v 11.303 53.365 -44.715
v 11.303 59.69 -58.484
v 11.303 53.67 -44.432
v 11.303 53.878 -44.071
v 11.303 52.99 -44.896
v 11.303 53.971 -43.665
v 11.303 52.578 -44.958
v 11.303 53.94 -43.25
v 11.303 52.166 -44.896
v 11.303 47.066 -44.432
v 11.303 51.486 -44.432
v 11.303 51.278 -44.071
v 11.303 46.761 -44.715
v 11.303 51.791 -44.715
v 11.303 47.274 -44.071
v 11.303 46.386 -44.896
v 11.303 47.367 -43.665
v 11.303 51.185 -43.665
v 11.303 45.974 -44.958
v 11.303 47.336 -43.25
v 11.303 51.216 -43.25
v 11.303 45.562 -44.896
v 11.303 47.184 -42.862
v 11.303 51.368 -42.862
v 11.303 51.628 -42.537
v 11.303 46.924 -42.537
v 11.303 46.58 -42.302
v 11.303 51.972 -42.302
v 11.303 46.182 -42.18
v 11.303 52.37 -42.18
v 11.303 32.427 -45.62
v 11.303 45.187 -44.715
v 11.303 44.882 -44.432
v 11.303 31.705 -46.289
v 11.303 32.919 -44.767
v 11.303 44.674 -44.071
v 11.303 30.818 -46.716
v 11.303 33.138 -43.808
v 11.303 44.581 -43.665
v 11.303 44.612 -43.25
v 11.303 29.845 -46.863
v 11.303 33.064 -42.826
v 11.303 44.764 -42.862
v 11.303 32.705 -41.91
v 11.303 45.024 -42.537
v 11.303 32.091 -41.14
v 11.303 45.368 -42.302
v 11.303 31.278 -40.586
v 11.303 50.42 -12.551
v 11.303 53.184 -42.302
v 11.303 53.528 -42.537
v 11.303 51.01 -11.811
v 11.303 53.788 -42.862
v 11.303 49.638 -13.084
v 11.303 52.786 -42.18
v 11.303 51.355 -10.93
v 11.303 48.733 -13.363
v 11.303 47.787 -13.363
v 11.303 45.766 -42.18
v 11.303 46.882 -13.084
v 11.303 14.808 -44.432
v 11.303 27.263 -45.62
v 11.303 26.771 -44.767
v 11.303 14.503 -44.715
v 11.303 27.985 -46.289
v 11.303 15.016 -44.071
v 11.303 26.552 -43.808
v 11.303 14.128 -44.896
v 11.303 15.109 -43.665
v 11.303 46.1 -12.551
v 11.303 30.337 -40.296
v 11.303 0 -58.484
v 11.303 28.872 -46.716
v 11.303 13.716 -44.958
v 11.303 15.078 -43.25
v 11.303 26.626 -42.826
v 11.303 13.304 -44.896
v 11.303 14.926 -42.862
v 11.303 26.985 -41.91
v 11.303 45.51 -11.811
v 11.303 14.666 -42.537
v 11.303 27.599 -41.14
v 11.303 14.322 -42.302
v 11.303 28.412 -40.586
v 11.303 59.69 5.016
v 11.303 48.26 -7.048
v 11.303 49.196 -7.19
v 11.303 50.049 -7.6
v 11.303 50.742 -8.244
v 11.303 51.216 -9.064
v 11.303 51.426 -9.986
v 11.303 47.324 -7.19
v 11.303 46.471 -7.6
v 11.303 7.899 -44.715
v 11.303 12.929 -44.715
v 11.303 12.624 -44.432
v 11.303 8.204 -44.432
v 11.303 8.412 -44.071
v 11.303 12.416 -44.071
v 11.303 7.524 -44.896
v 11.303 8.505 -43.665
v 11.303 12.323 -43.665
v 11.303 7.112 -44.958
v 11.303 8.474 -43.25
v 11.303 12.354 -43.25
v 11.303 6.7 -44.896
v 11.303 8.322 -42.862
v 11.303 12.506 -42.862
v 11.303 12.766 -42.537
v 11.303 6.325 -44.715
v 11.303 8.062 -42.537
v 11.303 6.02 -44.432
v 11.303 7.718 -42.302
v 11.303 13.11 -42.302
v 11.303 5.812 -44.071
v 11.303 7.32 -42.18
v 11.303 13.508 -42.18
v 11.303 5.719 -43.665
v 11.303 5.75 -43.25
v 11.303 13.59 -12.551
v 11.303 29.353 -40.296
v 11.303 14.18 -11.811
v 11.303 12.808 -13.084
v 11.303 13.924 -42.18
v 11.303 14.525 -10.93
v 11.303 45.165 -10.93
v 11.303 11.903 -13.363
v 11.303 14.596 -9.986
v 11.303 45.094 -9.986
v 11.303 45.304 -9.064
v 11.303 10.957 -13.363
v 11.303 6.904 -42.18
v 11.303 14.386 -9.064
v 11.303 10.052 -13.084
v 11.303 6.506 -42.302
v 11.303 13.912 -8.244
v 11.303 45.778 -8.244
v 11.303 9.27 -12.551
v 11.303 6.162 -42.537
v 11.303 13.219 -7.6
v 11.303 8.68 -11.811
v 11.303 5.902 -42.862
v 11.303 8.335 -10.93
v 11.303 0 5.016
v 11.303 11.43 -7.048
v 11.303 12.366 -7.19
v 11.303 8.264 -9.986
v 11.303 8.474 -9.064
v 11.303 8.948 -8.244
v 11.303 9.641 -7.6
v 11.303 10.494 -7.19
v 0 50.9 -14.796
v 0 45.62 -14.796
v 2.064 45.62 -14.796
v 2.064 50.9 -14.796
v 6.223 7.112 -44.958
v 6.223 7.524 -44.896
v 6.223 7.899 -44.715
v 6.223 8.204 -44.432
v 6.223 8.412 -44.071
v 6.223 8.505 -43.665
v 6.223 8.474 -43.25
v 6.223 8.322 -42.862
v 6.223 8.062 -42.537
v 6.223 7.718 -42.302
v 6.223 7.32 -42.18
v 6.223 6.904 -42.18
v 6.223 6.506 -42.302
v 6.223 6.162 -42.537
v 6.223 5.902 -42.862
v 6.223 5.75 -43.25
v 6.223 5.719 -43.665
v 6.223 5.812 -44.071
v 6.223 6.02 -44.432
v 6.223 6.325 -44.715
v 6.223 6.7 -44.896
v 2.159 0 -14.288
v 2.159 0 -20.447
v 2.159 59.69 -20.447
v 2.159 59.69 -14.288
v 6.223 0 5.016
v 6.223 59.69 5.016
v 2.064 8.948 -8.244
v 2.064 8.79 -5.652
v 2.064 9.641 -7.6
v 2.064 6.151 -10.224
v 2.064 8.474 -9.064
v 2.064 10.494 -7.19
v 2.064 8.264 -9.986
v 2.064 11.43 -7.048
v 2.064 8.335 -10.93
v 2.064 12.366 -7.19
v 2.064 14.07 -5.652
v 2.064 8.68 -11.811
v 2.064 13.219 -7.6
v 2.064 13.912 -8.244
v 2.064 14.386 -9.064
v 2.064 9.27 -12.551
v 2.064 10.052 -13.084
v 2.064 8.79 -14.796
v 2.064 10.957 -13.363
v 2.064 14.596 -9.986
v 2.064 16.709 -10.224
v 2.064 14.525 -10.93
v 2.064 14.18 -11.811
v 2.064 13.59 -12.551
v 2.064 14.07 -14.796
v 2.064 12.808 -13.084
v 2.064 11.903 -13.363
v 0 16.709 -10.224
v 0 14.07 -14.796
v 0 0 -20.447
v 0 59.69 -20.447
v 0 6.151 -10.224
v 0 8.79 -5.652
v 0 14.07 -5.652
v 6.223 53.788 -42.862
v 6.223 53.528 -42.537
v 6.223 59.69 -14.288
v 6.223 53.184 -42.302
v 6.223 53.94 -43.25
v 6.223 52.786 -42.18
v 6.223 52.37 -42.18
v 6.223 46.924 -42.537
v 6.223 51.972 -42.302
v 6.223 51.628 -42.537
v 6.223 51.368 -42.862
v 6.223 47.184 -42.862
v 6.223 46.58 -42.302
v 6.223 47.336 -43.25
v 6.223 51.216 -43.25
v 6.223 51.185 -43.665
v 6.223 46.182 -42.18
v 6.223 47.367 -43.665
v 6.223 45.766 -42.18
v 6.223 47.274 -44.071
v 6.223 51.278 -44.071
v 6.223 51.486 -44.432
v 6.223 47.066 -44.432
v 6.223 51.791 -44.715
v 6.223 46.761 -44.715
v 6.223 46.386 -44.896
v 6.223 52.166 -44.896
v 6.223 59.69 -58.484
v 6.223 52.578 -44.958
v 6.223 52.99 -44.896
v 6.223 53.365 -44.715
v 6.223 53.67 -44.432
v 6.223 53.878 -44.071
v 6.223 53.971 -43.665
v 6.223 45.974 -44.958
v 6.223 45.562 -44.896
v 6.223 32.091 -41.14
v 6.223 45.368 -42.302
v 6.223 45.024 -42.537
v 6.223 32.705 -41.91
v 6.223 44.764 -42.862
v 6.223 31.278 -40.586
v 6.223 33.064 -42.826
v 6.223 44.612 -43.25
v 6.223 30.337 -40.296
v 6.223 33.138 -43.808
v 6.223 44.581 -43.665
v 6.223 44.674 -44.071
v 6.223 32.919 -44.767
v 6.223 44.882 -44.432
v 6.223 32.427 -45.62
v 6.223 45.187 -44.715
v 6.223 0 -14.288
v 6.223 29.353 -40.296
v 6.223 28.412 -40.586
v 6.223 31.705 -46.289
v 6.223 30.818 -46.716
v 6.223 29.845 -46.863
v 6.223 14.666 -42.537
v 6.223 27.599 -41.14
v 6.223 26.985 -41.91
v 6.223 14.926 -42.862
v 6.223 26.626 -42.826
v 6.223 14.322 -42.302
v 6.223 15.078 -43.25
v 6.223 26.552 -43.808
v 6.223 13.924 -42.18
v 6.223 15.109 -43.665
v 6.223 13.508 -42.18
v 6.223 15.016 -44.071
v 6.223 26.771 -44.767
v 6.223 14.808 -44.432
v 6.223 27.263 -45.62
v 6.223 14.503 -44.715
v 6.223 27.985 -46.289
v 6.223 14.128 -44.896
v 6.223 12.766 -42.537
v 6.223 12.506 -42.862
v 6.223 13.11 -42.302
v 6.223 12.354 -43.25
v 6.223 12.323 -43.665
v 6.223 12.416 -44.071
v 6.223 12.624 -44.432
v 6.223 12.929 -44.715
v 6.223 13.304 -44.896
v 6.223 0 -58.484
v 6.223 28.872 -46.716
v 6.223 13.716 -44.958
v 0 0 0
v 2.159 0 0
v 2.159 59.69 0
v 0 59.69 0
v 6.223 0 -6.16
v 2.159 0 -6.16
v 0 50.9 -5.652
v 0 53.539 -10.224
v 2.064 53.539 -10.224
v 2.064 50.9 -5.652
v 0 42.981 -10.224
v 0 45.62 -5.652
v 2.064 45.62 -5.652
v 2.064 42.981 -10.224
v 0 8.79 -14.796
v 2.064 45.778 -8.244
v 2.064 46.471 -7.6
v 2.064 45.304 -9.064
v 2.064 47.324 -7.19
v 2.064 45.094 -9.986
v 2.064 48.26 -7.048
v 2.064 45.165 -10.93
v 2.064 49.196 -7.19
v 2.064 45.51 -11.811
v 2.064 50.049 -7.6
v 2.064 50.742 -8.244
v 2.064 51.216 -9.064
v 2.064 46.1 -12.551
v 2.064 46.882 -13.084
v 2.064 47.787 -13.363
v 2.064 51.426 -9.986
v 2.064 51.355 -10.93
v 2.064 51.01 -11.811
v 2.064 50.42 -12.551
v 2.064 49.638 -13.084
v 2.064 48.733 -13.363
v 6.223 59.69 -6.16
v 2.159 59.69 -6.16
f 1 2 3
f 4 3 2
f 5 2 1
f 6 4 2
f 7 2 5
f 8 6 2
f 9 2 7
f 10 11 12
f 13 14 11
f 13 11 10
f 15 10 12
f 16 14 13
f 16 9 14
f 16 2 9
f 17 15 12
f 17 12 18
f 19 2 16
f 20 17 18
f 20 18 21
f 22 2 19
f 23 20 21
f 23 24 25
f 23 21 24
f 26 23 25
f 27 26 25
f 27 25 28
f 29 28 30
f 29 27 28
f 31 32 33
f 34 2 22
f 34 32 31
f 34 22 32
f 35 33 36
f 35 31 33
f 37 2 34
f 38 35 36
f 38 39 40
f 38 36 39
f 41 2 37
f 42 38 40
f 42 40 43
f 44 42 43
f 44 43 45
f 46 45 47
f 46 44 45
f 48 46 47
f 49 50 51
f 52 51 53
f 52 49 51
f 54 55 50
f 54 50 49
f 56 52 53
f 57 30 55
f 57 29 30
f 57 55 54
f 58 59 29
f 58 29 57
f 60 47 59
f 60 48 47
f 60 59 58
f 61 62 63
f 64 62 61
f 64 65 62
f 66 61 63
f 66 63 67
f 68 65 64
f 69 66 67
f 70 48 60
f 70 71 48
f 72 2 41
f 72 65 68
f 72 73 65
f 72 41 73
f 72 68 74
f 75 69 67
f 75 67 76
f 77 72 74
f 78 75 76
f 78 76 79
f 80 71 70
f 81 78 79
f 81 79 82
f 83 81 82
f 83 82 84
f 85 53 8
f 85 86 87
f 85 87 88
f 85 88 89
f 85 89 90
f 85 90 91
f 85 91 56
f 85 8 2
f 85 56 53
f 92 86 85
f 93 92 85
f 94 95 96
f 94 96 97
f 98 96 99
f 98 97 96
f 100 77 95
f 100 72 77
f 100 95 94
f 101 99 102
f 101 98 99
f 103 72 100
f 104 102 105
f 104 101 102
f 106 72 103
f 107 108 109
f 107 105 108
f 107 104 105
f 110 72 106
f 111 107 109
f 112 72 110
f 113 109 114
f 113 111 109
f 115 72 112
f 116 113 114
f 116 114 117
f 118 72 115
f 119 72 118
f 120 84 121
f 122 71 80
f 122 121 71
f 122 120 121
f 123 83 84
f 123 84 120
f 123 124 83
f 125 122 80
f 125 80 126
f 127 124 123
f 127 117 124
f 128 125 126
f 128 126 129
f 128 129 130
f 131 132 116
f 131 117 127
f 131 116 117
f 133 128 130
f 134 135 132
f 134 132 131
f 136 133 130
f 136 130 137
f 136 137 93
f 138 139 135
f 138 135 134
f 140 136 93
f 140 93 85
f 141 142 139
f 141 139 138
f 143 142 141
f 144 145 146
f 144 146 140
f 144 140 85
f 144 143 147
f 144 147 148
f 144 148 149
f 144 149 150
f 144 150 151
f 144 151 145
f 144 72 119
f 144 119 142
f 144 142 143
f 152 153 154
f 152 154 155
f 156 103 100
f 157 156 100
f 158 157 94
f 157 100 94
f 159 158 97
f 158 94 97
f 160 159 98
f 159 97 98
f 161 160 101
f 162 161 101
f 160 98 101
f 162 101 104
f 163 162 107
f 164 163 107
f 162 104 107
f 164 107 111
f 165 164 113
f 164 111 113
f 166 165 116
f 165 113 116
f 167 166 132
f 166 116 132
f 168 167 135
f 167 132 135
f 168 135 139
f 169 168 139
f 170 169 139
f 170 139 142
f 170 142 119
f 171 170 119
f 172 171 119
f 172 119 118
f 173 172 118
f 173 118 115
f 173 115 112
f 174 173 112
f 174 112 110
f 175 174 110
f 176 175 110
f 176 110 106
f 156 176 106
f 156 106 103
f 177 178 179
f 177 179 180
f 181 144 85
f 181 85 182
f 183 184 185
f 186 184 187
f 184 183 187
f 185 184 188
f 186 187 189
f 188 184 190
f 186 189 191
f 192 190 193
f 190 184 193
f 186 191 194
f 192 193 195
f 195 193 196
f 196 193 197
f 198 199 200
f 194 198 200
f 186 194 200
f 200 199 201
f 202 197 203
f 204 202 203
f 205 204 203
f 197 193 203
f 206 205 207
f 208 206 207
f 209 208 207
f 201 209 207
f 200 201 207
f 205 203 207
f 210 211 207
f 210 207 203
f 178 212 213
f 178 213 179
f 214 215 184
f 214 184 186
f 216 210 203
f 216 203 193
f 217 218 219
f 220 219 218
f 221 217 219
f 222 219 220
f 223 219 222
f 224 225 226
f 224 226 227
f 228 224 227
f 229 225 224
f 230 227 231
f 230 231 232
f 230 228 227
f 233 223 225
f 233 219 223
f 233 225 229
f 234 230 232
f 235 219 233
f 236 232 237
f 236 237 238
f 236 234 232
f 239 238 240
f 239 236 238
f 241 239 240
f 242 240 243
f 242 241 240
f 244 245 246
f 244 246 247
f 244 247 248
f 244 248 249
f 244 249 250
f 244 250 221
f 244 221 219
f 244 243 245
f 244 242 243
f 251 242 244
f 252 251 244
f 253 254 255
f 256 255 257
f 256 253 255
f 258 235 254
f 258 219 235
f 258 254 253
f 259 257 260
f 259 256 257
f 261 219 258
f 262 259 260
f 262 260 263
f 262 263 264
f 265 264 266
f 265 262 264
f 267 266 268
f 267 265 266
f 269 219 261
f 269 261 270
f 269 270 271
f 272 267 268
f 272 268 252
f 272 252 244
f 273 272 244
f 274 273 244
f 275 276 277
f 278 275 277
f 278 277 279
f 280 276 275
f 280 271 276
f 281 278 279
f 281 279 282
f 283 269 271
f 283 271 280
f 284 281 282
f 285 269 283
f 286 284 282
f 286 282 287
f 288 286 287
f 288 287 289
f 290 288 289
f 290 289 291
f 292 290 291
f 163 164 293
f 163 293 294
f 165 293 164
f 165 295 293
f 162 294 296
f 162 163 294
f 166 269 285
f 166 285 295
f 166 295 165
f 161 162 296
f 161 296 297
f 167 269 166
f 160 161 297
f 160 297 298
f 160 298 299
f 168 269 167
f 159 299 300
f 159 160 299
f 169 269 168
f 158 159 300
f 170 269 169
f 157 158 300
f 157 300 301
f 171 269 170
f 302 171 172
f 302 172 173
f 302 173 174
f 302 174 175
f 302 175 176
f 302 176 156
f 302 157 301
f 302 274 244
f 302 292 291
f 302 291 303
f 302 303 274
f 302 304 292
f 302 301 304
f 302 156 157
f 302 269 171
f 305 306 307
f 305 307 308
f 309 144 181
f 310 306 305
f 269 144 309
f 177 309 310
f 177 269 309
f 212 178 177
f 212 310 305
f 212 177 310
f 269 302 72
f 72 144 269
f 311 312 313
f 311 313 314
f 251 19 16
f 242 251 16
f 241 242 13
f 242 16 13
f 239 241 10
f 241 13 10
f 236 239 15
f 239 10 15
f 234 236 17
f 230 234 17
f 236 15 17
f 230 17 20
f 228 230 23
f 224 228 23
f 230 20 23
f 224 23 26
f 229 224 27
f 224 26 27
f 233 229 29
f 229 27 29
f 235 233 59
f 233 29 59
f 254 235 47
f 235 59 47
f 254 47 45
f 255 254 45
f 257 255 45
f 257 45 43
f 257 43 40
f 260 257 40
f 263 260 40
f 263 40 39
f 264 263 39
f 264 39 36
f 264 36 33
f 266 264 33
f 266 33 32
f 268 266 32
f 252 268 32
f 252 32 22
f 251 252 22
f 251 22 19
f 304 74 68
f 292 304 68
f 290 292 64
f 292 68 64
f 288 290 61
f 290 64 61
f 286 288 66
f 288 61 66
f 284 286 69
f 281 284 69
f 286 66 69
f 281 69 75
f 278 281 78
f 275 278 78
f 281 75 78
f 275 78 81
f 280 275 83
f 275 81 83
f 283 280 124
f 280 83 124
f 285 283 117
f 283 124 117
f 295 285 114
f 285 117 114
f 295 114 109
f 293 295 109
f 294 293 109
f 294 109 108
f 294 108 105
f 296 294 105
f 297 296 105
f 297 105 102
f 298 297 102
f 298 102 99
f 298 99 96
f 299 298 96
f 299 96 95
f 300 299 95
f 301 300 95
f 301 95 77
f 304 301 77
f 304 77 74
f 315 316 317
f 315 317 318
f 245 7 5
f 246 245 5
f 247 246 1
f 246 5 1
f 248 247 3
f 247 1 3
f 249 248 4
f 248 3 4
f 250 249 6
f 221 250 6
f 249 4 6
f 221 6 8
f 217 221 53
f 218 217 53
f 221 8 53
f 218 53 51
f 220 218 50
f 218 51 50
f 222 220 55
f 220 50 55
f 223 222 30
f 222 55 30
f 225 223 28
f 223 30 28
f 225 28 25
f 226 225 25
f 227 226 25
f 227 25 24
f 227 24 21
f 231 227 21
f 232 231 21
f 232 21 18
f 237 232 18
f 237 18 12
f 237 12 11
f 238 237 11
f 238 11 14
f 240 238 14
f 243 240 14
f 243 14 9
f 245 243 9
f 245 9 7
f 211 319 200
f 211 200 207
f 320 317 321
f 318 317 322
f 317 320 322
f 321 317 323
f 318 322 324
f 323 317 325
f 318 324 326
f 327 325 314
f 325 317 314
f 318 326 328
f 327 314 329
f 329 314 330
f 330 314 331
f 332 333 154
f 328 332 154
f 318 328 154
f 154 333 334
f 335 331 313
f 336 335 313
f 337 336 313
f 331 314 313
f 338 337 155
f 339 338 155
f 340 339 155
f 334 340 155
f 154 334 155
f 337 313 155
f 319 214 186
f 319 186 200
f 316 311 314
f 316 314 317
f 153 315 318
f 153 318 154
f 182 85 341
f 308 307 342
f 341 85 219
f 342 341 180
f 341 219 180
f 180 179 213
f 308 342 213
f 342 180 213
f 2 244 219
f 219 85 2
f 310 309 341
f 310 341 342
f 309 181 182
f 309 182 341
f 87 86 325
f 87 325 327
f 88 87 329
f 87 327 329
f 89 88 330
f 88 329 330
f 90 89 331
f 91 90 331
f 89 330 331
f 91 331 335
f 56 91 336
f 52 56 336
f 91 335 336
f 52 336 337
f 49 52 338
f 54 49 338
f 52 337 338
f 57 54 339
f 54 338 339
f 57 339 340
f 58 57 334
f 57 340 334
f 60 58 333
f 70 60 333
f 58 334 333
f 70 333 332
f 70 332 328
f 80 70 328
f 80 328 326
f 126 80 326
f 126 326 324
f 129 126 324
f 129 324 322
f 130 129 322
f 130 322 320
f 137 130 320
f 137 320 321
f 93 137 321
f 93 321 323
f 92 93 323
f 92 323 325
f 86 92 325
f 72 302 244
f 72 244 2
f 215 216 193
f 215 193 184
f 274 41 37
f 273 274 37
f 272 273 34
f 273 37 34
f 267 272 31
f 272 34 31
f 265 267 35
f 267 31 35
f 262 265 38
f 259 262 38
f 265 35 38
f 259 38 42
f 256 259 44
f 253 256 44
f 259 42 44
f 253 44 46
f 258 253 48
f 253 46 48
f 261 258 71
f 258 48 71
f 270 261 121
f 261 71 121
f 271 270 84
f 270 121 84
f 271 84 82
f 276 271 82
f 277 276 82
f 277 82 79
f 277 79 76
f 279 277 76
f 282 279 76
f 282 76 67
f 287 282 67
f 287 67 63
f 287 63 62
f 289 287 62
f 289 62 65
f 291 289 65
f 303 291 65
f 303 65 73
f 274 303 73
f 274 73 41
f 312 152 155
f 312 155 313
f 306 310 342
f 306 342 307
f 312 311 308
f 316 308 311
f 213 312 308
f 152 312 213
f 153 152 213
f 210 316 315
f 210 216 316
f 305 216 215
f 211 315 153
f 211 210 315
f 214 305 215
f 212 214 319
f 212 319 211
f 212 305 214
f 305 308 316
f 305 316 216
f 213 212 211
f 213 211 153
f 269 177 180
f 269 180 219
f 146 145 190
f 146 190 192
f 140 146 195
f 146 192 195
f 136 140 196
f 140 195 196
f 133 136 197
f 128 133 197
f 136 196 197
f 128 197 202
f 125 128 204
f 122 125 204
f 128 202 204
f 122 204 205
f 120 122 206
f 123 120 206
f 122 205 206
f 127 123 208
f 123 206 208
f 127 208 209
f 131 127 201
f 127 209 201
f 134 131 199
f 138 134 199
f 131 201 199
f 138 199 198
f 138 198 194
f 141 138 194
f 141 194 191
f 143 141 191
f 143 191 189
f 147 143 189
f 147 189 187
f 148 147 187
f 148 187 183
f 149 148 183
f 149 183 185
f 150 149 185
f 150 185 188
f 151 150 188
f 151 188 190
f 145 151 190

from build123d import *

# Parameters (mm, degrees)
BOSS_EXTRUDE1_DEPTH = 59.69
SKETCH2_R           = 3.302
SKETCH2_R_2         = 1.397
CUT_EXTRUDE1_DEPTH  = 85.326589408
SKETCH3_R           = 3.175
CUT_EXTRUDE2_DEPTH  = 85.326589408
CUT_EXTRUDE3_DEPTH  = 2.06375


with BuildPart() as part:
    # Sketch1 → Boss-Extrude1 (new body)
    with BuildSketch(Plane(origin=(0, 0, 0), x_dir=(1, 0, 0), z_dir=(0, 1, 0))):
        Polygon((0, 0), (0, 20.447), (2.159, 20.447), (2.159, 14.2875), (6.223, 14.2875), (6.223, 58.4835), (11.303, 58.4835), (11.303, -5.0165), (6.223, -5.0165), (6.223, 6.1595), (2.159, 6.1595), (2.159, 0), align=None)
    extrude(amount=BOSS_EXTRUDE1_DEPTH)

    # Sketch2 → Cut-Extrude1 (cut, through all)
    with BuildSketch(Plane(origin=(11.303, 0, 0), x_dir=(0, 0, -1), z_dir=(1, 0, 0))):
        with Locations((43.561, 29.845)):
            Circle(SKETCH2_R)
        with Locations((43.561, 13.716)):
            Circle(SKETCH2_R_2)
        with Locations((43.561, 7.112)):
            Circle(SKETCH2_R_2)
        with Locations((43.561, 45.974)):
            Circle(SKETCH2_R_2)
        with Locations((43.561, 52.578)):
            Circle(SKETCH2_R_2)
    extrude(amount=-CUT_EXTRUDE1_DEPTH, mode=Mode.SUBTRACT)

    # Sketch3 → Cut-Extrude2 (cut, through all)
    with BuildSketch(Plane.ZY):
        with Locations((-10.2235, 48.26)):
            Circle(SKETCH3_R)
        with Locations((-10.2235, 11.43)):
            Circle(SKETCH3_R)
    extrude(amount=-CUT_EXTRUDE2_DEPTH, mode=Mode.SUBTRACT)

    # Sketch4 → Cut-Extrude3 (cut)
    with BuildSketch(Plane.ZY):
        Polygon((-14.7955, 8.790354569), (-14.7955, 14.069645431), (-10.2235, 16.709290861), (-5.6515, 14.069645431), (-5.6515, 8.790354569), (-10.2235, 6.150709139), align=None)
        Polygon((-14.7955, 45.620354569), (-14.7955, 50.899645431), (-10.2235, 53.539290861), (-5.6515, 50.899645431), (-5.6515, 45.620354569), (-10.2235, 42.980709139), align=None)
    extrude(amount=-CUT_EXTRUDE3_DEPTH, mode=Mode.SUBTRACT)


solid = part.part
